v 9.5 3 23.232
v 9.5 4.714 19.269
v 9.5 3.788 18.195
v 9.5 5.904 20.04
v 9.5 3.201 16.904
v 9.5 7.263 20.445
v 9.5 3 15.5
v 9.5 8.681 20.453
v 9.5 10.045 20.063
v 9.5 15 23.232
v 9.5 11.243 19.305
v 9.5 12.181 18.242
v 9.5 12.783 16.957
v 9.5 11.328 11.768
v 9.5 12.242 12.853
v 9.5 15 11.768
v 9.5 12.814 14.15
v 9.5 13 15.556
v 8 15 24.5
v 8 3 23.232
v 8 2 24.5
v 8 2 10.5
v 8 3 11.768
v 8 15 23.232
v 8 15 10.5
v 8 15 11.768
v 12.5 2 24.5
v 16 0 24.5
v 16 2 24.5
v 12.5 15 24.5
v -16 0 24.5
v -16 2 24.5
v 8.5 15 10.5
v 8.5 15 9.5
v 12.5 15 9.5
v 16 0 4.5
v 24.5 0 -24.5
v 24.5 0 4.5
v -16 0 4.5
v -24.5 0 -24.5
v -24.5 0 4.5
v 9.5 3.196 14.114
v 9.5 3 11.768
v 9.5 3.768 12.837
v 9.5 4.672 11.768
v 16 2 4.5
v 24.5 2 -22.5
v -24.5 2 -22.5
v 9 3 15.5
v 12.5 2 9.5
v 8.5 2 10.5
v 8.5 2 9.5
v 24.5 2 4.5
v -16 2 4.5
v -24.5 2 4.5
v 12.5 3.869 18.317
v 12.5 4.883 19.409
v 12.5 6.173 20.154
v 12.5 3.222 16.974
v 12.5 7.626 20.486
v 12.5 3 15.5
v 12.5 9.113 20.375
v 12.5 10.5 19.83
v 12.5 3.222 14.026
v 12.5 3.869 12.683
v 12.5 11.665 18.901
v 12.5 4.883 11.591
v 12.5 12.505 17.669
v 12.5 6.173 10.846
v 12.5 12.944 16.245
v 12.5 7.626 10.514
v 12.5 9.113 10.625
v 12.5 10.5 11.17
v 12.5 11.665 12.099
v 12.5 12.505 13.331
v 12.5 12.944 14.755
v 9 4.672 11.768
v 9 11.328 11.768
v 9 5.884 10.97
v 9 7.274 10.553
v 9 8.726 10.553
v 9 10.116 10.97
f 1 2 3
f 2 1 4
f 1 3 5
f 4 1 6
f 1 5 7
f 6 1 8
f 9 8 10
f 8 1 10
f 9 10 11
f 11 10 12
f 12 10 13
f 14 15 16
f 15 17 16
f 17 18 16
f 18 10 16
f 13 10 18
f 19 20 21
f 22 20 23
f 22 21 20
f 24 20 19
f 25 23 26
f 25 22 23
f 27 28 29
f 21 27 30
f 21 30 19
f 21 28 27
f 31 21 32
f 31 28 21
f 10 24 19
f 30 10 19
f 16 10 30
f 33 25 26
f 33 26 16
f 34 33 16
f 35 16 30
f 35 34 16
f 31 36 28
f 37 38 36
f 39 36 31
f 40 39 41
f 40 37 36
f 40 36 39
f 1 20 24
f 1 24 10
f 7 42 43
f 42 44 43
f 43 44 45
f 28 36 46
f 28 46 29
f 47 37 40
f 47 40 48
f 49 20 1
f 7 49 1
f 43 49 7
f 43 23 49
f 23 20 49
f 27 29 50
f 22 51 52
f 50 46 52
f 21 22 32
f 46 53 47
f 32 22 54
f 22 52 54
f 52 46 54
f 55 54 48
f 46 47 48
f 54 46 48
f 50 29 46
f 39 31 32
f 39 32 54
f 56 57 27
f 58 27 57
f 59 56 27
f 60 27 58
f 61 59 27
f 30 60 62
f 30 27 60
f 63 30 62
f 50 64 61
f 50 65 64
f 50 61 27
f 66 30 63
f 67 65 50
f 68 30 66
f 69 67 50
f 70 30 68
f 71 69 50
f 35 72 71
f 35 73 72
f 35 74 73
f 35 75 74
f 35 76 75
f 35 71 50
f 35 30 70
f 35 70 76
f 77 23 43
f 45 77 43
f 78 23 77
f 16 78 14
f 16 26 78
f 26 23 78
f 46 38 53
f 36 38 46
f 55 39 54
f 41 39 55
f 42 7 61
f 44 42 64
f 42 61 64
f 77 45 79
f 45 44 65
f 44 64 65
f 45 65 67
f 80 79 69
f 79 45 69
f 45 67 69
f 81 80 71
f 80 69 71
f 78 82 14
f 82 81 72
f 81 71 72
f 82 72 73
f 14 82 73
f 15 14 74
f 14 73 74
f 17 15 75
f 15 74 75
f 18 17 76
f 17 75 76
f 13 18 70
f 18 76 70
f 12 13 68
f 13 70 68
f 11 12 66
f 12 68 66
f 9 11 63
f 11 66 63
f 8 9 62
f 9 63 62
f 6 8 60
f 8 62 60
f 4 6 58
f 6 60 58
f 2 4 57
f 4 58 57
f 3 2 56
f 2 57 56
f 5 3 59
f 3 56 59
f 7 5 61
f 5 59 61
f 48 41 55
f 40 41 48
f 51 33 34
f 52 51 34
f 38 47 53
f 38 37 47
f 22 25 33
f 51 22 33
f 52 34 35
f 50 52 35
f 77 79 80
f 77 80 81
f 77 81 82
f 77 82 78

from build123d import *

# Parameters (mm, degrees)
EXTRUDE_1_DEPTH     = 2
EXTRUDE_START       = -2
SKETCH_2_W          = 14
SKETCH_2_H          = 13
SKETCH_2_R          = 1.5
EXTRUDE_2_DEPTH     = 4.5
SKETCH_3_W          = 1.5
SKETCH_3_H          = 1.268219588
EXTRUDE_3_DEPTH     = 13
SKETCH_4_W          = 1.5
SKETCH_4_H          = 1
EXTRUDE_4_DEPTH     = 11.463560824
CUT_EXTRUDE_1_REACH = 39.756
SKETCH_5_W          = 1.5
SKETCH_5_H          = 14
SKETCH_7_W          = 4
SKETCH_7_H          = 1
EXTRUDE_5_DEPTH     = 13
CUT_EXTRUDE_START   = 0.5
SKETCH_6_R          = 5
CUT_EXTRUDE_2_DEPTH = 4
CUT_EXTRUDE_3_DEPTH = 49


with BuildPart() as part:
    # Эскиз1 → Бобышка-Вытянуть1 (new body)
    with BuildSketch(Plane(origin=(0, 0, 0), x_dir=(1, 0, 0), z_dir=(0, 1, 0))):
        Polygon((16, -4.5), (16, -24.5), (-16, -24.5), (-16, -4.5), (-24.5, -4.5), (-24.5, 24.5), (24.5, 24.5), (24.5, -4.5), align=None)
    extrude(amount=EXTRUDE_1_DEPTH)

    # Эскиз2 → Бобышка-Вытянуть2 (add)
    with BuildSketch(Plane(origin=(16, 0, 0), x_dir=(0, 0, -1), z_dir=(1, 0, 0)).offset(EXTRUDE_START)):
        with Locations((-17.5, 8.5)):
            Rectangle(SKETCH_2_W, SKETCH_2_H)
        with Locations((-15.5, 8)):
            Circle(SKETCH_2_R, mode=Mode.SUBTRACT)
    extrude(amount=-EXTRUDE_2_DEPTH)

    # Эскиз3 → Бобышка-Вытянуть3 (add)
    with BuildSketch(Plane(origin=(0, 15, 0), x_dir=(1, 0, 0), z_dir=(0, 1, 0))):
        with Locations((8.75, -11.134109794)):
            Rectangle(SKETCH_3_W, SKETCH_3_H)
        with Locations((8.75, -23.865890206)):
            Rectangle(SKETCH_3_W, SKETCH_3_H)
    extrude(amount=-EXTRUDE_3_DEPTH)

    # Эскиз4 → Бобышка-Вытянуть4 (add)
    with BuildSketch(Plane.XY.offset(11.768219588)):
        with Locations((8.75, 2.5)):
            Rectangle(SKETCH_4_W, SKETCH_4_H)
    extrude(amount=EXTRUDE_4_DEPTH)

    # Вырез-Вытянуть1: up to this face of the body (flat: up to its plane)
    cut_extrude_1_end = Plane(part.part.faces().sort_by_distance((-0.46737481, 2, -3.237228123))[0])
    # Эскиз5 → Вырез-Вытянуть1 (cut, up to the picked face)
    with BuildSketch(Plane(origin=(0, 15, 0), x_dir=(1, 0, 0), z_dir=(0, 1, 0)), mode=Mode.PRIVATE) as cut_extrude_1_sk1:
        with Locations((13.25, -17.5)):
            Rectangle(SKETCH_5_W, SKETCH_5_H)
    cut_extrude_1_tool1 = split(extrude(cut_extrude_1_sk1.sketch, amount=-CUT_EXTRUDE_1_REACH, mode=Mode.PRIVATE), bisect_by=cut_extrude_1_end, keep=Keep.BOTH, mode=Mode.PRIVATE)
    add(cut_extrude_1_tool1.solids().sort_by(Axis((13.25, 15, 17.5), (0, -1, 0)))[0], mode=Mode.SUBTRACT)

    # Эскиз7 → Бобышка-Вытянуть5 (add)
    with BuildSketch(Plane(origin=(0, 15, 0), x_dir=(1, 0, 0), z_dir=(0, 1, 0))):
        with Locations((10.5, -10)):
            Rectangle(SKETCH_7_W, SKETCH_7_H)
    extrude(amount=-EXTRUDE_5_DEPTH)

    # Эскиз6 → Вырез-Вытянуть2 (cut)
    with BuildSketch(Plane(origin=(12.5, 0, 0), x_dir=(0, 0, -1), z_dir=(1, 0, 0)).offset(CUT_EXTRUDE_START)):
        with Locations(Location((-15.5, 8, 0), (0, 0, 270))):
            Circle(SKETCH_6_R)
    extrude(amount=-CUT_EXTRUDE_2_DEPTH, mode=Mode.SUBTRACT)

    # Эскиз8 → Вырез-Вытянуть3 (cut)
    with BuildSketch(Plane(origin=(24.5, 0, 0), x_dir=(0, 0, -1), z_dir=(1, 0, 0))):
        Polygon((24.5, 0), (22.5, 2), (24.5, 2), align=None)
    extrude(amount=-CUT_EXTRUDE_3_DEPTH, mode=Mode.SUBTRACT)


solid = part.part
